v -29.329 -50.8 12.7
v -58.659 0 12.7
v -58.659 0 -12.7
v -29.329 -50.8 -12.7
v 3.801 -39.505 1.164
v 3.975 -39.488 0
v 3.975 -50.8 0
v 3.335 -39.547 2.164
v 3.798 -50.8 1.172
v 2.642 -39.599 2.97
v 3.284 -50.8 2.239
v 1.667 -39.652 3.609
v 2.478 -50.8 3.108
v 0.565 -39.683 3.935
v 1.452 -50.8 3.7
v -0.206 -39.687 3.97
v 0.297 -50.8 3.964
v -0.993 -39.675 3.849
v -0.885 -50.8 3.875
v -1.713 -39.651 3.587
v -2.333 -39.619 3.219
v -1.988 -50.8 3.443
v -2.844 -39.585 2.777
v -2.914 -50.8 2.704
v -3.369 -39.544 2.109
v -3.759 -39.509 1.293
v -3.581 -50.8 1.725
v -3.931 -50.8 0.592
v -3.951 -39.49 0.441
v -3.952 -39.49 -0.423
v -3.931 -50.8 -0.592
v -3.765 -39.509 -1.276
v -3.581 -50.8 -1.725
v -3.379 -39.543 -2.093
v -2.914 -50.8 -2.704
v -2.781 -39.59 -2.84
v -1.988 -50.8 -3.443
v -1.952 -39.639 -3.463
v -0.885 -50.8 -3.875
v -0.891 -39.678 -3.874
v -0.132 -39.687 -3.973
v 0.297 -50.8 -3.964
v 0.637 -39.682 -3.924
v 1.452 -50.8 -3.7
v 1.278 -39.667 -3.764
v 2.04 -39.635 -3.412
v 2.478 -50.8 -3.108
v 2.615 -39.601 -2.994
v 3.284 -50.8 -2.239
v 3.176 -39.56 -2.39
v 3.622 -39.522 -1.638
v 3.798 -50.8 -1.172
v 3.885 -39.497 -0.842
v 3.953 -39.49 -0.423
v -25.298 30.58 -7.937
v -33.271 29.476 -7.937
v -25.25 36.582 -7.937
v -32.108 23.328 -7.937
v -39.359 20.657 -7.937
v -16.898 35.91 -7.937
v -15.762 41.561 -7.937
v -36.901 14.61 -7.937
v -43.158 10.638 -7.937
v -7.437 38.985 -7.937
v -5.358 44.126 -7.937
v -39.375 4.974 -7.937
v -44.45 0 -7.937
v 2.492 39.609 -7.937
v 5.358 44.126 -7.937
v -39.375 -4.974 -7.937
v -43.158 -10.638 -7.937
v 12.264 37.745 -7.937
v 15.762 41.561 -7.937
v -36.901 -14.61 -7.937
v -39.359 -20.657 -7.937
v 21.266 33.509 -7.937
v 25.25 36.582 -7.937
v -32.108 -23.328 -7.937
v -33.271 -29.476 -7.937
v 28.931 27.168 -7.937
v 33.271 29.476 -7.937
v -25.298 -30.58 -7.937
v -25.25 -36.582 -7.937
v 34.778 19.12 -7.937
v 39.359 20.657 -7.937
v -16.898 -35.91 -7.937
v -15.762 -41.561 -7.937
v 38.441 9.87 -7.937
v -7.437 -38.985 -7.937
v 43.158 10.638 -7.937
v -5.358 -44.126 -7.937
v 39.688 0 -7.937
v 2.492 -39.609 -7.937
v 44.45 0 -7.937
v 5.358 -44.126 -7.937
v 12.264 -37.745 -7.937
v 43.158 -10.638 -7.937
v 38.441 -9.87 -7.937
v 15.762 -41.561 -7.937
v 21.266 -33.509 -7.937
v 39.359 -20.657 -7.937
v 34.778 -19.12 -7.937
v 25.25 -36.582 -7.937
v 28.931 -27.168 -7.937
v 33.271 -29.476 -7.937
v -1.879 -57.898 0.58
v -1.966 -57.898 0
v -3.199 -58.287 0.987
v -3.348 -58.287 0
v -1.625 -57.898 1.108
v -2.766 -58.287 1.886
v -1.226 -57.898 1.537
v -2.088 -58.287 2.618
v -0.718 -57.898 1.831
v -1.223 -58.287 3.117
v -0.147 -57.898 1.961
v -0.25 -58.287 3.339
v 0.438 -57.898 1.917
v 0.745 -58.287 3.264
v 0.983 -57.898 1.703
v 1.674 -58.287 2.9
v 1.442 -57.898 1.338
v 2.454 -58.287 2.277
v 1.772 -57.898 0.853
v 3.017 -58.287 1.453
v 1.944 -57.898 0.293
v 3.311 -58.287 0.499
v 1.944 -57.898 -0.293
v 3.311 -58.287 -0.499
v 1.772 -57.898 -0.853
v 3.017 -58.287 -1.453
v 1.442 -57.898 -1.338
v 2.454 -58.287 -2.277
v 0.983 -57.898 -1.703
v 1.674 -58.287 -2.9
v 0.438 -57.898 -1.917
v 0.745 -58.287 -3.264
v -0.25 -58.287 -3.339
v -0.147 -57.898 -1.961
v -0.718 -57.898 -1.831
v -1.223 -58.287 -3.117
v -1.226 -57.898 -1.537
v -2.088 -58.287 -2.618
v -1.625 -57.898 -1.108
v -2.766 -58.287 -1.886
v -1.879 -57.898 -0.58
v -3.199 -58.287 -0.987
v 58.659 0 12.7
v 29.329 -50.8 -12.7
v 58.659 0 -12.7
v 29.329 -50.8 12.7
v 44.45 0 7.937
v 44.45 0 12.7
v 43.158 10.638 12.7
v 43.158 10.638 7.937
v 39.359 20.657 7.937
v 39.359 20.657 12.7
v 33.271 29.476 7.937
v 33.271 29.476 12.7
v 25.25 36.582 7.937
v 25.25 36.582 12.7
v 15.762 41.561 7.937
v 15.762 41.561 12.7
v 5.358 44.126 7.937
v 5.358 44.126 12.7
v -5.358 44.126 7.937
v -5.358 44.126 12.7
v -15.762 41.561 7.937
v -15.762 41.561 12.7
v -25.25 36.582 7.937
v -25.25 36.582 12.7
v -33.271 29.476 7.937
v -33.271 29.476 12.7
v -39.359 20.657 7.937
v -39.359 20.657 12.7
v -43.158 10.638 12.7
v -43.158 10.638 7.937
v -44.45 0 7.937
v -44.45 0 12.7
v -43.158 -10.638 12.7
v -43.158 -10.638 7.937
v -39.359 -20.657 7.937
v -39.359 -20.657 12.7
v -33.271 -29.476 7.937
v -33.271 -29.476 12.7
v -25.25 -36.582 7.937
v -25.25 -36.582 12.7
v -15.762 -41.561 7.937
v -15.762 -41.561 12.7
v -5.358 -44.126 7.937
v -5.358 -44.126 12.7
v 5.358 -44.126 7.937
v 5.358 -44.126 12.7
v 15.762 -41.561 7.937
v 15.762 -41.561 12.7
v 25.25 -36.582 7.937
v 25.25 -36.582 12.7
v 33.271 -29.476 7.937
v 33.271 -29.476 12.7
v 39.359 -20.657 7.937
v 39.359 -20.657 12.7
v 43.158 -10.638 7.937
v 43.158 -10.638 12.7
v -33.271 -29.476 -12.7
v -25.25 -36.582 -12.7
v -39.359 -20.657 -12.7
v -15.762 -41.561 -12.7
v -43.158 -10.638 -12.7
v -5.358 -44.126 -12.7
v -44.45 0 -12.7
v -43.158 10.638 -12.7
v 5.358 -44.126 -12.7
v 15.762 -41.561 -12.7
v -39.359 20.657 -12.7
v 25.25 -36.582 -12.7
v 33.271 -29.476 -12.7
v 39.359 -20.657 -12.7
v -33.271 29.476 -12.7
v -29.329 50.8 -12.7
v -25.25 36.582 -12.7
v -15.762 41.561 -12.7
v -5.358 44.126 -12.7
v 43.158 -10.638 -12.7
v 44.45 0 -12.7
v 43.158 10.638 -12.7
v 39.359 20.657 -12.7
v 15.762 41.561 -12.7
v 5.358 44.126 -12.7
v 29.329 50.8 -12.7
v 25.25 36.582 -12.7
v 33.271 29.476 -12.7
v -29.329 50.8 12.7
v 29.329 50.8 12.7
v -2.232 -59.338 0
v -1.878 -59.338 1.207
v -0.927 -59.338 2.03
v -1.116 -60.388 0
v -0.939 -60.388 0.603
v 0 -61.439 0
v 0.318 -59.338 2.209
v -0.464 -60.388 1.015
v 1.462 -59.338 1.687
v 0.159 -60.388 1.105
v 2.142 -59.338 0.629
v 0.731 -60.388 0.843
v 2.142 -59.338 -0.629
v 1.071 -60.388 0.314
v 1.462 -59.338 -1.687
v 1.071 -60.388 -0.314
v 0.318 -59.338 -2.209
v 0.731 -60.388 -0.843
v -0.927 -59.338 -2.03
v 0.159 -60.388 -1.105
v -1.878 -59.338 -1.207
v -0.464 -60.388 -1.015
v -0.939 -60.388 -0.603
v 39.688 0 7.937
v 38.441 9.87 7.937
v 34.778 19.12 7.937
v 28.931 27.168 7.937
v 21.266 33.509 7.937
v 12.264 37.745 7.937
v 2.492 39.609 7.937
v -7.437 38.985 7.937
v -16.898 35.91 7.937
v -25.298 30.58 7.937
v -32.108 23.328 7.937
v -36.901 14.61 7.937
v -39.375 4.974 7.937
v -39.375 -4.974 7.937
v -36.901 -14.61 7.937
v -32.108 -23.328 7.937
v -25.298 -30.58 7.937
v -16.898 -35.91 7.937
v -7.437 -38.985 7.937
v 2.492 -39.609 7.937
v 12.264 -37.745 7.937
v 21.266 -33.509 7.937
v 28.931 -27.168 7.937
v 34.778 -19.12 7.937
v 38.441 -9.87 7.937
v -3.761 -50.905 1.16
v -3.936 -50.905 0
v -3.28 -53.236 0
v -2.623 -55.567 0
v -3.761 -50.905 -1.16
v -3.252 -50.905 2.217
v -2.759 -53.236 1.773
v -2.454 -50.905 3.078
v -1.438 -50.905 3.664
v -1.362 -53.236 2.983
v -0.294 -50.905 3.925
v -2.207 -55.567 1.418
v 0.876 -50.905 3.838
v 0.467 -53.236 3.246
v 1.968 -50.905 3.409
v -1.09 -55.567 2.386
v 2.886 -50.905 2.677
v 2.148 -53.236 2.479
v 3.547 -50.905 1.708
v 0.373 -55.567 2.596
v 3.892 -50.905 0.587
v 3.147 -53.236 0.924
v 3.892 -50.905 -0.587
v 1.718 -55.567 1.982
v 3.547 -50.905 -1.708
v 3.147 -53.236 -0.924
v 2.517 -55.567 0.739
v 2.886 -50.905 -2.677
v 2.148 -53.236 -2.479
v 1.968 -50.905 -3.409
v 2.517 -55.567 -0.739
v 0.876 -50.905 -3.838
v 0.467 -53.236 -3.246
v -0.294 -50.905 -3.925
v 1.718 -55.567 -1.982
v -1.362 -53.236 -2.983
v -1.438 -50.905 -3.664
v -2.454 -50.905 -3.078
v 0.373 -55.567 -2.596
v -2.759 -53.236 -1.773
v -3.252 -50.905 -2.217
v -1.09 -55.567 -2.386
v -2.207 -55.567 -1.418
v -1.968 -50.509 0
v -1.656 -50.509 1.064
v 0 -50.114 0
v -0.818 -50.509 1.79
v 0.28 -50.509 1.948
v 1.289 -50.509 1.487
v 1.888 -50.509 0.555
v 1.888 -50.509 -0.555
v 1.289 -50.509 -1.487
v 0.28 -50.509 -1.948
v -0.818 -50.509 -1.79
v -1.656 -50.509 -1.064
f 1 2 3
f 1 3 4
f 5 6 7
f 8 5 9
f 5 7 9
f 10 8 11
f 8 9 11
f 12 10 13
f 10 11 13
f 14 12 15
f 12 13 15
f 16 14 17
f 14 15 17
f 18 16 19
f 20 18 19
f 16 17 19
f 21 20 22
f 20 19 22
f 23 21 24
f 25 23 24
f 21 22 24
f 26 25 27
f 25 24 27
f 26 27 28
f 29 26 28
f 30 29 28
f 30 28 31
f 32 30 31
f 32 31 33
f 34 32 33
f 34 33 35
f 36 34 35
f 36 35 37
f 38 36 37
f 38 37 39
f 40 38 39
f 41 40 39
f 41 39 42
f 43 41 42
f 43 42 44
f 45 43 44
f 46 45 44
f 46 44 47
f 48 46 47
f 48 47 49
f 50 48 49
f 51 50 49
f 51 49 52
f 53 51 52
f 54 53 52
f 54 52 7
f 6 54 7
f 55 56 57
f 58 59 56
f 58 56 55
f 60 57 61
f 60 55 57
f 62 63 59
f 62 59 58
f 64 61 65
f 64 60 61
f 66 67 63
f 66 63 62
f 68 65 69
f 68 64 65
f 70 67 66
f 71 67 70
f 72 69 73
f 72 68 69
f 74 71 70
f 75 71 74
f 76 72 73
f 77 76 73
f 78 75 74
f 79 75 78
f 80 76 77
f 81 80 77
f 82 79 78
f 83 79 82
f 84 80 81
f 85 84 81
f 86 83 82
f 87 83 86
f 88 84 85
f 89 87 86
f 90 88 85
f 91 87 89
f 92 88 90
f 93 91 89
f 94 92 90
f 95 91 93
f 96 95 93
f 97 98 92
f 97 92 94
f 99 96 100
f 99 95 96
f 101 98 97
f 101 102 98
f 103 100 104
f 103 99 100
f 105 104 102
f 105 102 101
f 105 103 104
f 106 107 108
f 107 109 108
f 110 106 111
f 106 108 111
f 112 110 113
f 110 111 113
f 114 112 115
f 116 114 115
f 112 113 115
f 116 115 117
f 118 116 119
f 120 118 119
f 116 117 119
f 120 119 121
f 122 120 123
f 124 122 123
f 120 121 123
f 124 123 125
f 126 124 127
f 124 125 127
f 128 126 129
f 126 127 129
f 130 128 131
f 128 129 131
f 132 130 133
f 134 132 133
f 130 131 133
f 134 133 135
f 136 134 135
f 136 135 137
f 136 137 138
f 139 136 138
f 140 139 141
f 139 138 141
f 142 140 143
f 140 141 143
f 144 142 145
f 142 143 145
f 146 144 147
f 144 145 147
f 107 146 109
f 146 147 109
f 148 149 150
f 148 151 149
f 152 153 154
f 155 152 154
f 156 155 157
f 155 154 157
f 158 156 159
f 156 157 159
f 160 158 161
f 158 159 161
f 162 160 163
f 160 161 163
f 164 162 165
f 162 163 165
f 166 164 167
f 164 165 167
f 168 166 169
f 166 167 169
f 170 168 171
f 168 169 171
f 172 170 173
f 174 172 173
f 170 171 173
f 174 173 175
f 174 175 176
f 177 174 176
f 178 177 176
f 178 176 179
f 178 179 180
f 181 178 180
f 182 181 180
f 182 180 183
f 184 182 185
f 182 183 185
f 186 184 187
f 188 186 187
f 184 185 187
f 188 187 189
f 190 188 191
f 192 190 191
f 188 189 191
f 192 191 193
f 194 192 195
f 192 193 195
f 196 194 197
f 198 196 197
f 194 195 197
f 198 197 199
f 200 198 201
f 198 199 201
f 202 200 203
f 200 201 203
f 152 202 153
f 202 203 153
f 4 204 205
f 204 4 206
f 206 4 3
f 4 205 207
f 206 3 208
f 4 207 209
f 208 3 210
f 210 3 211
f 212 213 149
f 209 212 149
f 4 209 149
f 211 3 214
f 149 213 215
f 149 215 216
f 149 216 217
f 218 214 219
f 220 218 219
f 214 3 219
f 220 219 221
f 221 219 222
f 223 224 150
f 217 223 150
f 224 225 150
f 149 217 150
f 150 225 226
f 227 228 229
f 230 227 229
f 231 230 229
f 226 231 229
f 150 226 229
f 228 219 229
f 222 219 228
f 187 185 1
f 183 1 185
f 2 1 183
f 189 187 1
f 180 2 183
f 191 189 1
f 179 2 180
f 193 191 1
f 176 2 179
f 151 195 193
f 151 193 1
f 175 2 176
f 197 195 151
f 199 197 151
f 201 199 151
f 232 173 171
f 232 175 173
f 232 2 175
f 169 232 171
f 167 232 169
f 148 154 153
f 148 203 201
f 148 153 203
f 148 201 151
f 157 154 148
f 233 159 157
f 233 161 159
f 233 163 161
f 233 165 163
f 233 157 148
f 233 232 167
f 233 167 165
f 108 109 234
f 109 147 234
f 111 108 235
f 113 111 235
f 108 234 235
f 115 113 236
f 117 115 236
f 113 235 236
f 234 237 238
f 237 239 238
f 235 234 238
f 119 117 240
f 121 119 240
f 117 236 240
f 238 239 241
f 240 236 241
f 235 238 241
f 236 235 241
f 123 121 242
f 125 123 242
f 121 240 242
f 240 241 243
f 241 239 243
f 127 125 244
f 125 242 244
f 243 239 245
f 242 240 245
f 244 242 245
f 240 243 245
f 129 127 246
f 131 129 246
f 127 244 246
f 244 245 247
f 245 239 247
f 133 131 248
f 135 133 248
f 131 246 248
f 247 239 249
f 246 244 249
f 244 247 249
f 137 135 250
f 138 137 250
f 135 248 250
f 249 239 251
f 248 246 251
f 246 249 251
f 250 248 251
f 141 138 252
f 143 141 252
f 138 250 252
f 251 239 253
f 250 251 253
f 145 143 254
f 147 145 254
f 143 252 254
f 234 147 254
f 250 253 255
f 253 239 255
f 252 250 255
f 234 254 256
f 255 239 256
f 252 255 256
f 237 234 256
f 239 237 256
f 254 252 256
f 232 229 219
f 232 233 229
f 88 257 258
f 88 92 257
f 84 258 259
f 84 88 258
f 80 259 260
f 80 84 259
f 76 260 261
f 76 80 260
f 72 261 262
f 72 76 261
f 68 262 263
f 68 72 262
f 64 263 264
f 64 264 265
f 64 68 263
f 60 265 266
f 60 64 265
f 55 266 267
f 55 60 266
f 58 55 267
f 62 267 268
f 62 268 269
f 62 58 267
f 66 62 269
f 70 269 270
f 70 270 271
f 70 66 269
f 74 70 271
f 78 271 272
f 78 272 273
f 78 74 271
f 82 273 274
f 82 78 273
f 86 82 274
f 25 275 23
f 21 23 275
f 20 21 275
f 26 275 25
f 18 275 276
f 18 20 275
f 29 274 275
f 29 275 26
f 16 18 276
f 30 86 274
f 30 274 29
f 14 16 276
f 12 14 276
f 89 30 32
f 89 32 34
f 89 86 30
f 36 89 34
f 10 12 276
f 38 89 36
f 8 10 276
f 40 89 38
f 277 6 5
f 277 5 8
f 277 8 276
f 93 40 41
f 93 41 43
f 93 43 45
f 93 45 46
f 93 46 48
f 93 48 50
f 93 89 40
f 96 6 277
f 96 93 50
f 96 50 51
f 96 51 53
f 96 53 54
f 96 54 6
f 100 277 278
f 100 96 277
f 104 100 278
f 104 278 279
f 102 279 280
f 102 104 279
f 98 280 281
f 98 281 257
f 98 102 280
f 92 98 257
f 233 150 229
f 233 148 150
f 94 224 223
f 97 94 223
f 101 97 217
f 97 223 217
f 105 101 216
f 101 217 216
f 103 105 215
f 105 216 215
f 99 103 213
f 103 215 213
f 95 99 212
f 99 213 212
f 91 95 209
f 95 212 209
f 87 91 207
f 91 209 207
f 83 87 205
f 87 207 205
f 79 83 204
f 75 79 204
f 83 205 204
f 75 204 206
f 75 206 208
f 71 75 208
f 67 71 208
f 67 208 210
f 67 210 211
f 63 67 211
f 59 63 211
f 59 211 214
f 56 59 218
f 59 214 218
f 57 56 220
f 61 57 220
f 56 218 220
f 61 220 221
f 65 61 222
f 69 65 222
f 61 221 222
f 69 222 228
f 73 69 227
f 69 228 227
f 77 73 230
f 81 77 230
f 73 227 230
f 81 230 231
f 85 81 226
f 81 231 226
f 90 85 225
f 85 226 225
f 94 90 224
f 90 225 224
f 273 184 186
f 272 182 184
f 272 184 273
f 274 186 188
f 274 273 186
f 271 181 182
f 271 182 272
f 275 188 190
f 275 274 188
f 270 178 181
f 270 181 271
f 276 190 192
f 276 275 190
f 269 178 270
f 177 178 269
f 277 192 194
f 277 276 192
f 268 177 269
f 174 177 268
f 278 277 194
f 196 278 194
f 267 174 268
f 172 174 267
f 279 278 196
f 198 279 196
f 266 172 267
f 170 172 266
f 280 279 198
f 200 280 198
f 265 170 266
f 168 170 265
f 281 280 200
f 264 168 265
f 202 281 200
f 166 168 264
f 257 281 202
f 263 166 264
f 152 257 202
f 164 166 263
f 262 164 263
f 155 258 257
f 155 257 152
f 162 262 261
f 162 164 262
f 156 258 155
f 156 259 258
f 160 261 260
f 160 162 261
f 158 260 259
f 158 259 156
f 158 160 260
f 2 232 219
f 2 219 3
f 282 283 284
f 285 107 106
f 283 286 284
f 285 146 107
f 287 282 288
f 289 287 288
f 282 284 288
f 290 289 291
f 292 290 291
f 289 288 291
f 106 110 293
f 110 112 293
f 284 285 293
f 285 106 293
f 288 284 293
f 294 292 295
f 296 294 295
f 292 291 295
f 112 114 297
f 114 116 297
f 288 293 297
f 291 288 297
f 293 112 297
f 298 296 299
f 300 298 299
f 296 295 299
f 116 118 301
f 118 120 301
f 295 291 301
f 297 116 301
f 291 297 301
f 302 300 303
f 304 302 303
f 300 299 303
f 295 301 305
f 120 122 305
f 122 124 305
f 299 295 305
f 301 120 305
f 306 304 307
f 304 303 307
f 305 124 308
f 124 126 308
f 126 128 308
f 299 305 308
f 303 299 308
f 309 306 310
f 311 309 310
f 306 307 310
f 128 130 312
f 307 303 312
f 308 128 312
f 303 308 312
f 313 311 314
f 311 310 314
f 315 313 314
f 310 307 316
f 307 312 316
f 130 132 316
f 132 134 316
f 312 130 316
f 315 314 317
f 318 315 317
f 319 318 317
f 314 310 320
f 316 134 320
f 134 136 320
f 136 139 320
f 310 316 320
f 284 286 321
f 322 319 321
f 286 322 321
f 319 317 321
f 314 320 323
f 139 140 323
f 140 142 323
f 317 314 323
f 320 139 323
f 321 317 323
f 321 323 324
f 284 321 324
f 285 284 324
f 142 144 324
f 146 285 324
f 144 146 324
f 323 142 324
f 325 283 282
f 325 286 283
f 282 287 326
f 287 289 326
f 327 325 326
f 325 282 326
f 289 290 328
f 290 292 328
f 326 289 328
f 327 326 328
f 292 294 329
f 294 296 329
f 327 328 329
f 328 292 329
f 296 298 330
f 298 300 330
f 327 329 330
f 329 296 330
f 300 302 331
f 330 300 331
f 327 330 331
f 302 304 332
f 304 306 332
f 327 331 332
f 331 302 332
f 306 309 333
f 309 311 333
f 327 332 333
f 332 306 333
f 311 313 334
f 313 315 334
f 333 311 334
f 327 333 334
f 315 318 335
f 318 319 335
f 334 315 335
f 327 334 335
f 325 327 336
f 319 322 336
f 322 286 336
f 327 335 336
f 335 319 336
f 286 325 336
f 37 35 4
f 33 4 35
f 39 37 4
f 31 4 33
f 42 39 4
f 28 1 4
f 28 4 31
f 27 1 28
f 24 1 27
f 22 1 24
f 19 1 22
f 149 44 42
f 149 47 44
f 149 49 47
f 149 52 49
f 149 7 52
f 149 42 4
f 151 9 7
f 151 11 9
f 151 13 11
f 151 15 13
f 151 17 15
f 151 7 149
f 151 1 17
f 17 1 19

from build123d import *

# Parameters (mm, degrees)
F0_R     = 39.6875
F1_DEPTH = 12.7
F2_R     = 44.45
F2_R_2   = 39.6875
F3_DEPTH = 4.7625
F4_R     = 44.45
F4_R_2   = 39.6875
F5_DEPTH = 4.7625
F6_R     = 3.9751
F7_DEPTH = 11.3130749046


with BuildPart() as f1:
    # F0 (on Top) → F1 (new body, symmetric)
    with BuildSketch(Plane.XY):
        Polygon((29.3293936748, 50.8), (-29.3293936748, 50.8), (-58.6587873497, 0), (-29.3293936748, -50.8), (29.3293936748, -50.8), (58.6587873497, 0), align=None)
        Circle(F0_R, mode=Mode.SUBTRACT)
    extrude(amount=F1_DEPTH, both=True)

    # F2 (on face) → F3 (cut)
    with BuildSketch(Plane.XY.offset(12.7)):
        Circle(F2_R)
        Circle(F2_R_2, mode=Mode.SUBTRACT)
    extrude(amount=-F3_DEPTH, mode=Mode.SUBTRACT)

    # F4 (on face) → F5 (cut)
    with BuildSketch(Plane(origin=(0, 0, -12.7), x_dir=(1, 0, 0), z_dir=(0, 0, -1))):
        Circle(F4_R)
        Circle(F4_R_2, mode=Mode.SUBTRACT)
    extrude(amount=-F5_DEPTH, mode=Mode.SUBTRACT)

    # F6 (on face) → F7 (cut, through all)
    with BuildSketch(Plane.XZ.offset(50.8)):
        Circle(F6_R)
    extrude(amount=-F7_DEPTH, mode=Mode.SUBTRACT)


with BuildPart() as f9:
    # F8 (on Top) → F9 (revolve)
    with BuildSketch(Plane.XY):
        Polygon((0, -50.1139573753), (-3.9363633841, -50.9049855173), (-1.9664389547, -57.8975602984), (-3.3482198015, -58.2868309078), (0, -61.4389628172), align=None)
    revolve(axis=Axis((0, -55.7764600962, 0), (0, 1, 0)))


solid = Compound([f1.part, f9.part])
